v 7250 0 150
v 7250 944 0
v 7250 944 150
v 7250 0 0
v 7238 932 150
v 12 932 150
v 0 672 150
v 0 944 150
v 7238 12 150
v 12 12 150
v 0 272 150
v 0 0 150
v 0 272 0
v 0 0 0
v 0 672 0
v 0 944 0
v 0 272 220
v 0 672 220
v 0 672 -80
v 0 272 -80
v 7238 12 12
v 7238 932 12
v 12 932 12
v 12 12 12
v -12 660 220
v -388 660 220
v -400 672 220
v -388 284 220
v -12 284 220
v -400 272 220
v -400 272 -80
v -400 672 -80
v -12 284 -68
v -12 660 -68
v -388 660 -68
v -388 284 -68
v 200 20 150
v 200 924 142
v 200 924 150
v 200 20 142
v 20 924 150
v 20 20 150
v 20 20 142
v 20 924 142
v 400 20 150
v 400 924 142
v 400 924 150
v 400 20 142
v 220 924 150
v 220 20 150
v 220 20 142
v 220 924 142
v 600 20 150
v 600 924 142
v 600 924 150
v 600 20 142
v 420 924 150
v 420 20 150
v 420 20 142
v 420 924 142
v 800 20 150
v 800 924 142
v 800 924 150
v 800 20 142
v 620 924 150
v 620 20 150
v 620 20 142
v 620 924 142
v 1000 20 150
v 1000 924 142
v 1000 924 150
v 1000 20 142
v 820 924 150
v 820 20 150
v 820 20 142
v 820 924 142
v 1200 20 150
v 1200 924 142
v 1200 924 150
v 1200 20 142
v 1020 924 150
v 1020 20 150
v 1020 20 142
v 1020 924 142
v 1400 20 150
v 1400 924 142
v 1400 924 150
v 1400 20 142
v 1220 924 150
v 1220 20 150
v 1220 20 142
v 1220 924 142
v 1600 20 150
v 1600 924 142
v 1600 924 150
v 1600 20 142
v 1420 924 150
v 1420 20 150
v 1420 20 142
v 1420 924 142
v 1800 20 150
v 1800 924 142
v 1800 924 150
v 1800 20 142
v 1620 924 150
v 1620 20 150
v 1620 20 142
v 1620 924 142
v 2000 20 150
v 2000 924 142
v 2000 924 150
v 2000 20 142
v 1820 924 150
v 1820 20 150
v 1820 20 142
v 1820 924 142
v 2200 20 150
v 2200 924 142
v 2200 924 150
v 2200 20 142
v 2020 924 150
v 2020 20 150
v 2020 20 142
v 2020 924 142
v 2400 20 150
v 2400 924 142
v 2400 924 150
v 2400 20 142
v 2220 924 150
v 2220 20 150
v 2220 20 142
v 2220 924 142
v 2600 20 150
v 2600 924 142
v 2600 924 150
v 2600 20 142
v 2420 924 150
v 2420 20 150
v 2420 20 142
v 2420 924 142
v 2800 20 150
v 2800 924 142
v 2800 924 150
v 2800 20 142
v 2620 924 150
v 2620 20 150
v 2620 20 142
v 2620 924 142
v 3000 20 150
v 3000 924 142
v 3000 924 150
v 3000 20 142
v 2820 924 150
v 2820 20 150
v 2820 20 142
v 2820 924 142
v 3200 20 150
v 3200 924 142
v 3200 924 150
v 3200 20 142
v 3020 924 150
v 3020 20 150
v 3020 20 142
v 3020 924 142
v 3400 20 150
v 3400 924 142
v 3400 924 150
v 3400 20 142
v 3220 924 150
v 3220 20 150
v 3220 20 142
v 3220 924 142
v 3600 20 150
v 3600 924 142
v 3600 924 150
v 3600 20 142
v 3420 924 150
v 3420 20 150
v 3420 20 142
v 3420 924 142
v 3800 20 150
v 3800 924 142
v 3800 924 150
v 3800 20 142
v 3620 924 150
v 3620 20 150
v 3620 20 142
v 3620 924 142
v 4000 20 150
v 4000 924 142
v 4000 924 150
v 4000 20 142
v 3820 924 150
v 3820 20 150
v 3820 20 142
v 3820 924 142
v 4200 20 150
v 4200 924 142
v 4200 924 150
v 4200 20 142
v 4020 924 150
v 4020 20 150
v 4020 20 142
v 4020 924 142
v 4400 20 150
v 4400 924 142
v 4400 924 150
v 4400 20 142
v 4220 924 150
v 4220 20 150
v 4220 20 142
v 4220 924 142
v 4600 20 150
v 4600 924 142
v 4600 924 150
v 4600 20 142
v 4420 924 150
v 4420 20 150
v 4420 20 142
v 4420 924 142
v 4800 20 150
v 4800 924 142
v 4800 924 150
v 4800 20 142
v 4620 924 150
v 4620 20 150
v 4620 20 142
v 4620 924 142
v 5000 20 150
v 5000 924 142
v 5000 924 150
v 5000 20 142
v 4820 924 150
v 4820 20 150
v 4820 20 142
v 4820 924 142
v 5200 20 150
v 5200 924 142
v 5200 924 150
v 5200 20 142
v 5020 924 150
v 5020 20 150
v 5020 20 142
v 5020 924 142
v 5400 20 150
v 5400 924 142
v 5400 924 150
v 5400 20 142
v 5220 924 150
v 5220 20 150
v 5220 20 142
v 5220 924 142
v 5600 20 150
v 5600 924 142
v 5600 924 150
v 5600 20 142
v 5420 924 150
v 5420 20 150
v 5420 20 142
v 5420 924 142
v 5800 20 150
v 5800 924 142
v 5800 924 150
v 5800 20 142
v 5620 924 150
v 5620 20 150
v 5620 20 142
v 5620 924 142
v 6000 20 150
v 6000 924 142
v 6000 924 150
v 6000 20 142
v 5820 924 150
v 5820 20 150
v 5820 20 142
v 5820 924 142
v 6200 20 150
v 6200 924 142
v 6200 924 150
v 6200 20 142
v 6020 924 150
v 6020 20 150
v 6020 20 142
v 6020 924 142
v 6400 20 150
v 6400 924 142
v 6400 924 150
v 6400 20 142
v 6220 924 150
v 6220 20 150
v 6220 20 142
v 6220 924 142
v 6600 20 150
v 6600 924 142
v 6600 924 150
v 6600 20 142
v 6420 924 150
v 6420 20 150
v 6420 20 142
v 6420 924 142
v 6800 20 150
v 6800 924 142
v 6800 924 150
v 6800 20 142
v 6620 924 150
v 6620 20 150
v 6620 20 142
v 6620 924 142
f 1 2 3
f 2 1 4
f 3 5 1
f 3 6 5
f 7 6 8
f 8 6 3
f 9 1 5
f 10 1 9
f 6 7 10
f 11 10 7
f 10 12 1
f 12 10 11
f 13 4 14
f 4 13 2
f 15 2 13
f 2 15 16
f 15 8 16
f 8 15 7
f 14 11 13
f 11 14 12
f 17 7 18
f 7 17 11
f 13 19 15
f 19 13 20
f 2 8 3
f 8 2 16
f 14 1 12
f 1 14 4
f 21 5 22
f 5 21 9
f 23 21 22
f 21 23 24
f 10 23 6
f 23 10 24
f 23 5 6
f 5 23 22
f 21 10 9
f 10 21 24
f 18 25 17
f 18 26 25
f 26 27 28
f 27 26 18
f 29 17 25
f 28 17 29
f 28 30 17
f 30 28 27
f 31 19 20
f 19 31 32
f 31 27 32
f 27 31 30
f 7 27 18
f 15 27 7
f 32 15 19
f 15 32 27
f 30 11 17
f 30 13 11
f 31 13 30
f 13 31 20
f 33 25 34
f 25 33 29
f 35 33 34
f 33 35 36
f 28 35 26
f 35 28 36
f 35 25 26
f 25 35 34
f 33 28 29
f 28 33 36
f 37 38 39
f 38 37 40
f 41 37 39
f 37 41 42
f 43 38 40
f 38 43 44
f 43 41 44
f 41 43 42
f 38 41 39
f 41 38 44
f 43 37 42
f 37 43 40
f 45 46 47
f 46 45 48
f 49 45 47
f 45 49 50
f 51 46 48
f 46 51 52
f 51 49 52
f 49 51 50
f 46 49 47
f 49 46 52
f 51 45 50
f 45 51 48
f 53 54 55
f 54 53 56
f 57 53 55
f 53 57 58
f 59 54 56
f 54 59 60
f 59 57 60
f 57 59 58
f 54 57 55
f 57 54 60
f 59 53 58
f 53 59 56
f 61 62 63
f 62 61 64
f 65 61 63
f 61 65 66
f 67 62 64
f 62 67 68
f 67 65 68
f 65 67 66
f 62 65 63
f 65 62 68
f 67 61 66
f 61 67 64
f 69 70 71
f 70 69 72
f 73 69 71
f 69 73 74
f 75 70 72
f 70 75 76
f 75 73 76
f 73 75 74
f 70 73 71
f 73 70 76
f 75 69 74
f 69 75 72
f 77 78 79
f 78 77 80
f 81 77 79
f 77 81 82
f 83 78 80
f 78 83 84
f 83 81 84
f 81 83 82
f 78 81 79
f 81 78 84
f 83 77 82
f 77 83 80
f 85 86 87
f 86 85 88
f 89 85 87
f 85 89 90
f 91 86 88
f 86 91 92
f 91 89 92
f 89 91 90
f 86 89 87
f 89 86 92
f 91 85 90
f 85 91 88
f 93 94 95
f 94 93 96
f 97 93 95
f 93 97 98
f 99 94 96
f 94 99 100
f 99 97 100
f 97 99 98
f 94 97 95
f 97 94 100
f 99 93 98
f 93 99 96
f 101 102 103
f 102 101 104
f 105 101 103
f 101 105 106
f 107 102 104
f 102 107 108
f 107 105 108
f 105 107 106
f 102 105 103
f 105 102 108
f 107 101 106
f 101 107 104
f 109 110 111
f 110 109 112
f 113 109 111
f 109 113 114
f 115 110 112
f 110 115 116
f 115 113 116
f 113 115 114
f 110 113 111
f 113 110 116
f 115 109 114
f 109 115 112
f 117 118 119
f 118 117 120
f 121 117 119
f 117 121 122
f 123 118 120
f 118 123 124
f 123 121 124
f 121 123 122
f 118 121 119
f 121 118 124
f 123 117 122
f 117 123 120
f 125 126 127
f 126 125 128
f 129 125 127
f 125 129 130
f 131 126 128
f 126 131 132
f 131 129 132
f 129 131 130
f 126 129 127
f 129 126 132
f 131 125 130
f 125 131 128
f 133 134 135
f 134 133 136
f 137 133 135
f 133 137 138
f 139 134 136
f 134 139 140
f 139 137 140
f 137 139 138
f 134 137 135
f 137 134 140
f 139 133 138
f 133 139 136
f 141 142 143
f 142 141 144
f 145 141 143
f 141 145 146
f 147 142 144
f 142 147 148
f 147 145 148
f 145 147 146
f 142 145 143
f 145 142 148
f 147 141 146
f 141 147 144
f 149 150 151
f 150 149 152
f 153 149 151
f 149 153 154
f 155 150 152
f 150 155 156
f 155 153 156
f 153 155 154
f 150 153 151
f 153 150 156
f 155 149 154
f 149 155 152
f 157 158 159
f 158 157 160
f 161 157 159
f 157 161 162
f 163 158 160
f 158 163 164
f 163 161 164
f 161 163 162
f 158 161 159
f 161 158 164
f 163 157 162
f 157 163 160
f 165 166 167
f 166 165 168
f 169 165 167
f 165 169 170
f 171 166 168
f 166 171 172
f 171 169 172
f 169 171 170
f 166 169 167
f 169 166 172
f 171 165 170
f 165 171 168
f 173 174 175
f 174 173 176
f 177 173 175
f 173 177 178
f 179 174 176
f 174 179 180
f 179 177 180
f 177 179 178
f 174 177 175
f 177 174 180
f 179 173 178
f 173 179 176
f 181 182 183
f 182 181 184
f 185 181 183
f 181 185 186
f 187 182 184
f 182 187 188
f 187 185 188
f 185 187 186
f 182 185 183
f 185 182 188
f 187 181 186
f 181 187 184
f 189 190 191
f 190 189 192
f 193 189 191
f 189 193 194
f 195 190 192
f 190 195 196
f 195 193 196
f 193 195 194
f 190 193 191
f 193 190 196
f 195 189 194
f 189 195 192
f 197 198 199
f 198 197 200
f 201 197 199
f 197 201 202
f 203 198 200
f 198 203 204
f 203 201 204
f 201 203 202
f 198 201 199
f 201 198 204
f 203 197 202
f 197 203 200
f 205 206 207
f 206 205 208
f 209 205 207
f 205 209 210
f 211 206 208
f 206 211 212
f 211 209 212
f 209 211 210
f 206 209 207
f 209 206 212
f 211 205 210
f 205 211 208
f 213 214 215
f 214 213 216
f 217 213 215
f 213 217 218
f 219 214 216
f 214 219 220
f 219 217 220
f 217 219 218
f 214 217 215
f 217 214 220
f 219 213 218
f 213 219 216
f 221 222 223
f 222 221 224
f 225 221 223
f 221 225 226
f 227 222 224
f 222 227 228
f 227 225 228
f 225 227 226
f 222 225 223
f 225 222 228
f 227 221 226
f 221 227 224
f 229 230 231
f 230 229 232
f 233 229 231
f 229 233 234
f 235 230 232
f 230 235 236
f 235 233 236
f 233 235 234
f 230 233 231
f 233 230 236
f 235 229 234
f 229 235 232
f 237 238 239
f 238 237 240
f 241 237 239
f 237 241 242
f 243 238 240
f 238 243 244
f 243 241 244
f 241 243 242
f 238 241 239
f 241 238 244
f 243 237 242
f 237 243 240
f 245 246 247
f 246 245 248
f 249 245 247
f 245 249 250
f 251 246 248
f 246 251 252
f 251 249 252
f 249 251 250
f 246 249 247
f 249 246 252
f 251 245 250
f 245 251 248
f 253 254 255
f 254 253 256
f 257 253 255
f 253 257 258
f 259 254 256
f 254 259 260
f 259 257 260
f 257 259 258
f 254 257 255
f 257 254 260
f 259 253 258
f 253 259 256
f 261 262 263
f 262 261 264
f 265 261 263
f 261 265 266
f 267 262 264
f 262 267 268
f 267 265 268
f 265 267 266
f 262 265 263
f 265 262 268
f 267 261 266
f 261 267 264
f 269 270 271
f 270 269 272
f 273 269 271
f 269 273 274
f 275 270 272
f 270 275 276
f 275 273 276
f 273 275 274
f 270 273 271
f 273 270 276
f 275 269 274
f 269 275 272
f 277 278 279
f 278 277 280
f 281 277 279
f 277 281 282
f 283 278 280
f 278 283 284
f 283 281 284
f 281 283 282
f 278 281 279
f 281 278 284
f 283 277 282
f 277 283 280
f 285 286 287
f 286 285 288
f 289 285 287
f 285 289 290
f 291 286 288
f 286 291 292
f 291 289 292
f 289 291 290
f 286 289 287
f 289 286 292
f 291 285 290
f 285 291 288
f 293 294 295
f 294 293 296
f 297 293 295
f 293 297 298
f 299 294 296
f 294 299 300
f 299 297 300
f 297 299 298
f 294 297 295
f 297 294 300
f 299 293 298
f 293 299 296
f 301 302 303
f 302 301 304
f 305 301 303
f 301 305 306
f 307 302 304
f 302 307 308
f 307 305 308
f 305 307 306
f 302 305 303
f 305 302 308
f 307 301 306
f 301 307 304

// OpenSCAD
// file: ../params.scad
// Shared millimetre parameters. Keep in lockstep with freecad/params.py.
// Module scale: 150 kg/day wet train. Walls are CPVC sheet, not metal.

$fn = 36;

WALL        = 12;     // CPVC sheet thickness
FLOOR       = 16;     // floor plate (trough sits on this)

// LEACH CSTR 1 — inside liquor box
CSTR_L      = 2000;
CSTR_W      = 1200;
CSTR_H      = 1400;   // liquid + freeboard
FREEBOARD   = 200;

// CSTR 2 weir (same vessel, +X wall)
WEIR_W      = 450;
WEIR_CREST  = CSTR_H - FREEBOARD;   // from inner floor
WEIR_SLOT_H = 80;
WEIR_LIP    = 120;    // external spout projection

// CSTR 3 floor auger — injection-molded PVC / FG
AUGER_D     = 140;    // flight OD
AUGER_SHAFT = 40;
AUGER_PITCH = 110;
AUGER_TROUGH_W = 180;
AUGER_TROUGH_H = 110;
AUGER_OFFSET_Y = 280; // trough centreline from inner -Y wall
AUGER_INCLINE  = 28;  // deg, lifts out of liquor toward +X

// mixer / nozzles (lid)
MIXER_D     = 50;
GAS_D       = 80;     // acid-gas takeoff
DROP_X      = 80;     // inner-X of shred drop slot
DROP_L      = 400;
DROP_W      = 250;
DROP_COAM   = 80;     // raised coaming around the slot

// LEACHATE PUMP / coarse strainer — −X wall, opposite the weir
PUMP_D      = 80;     // DN80
PUMP_Z      = 450;    // centreline above inner floor (submerged)
PUMP_Y      = 900;    // centreline from inner −Y (away from auger)
STRAINER_L  = 180;
STRAINER_W  = 140;
STRAINER_H  = 160;

// mezzanine feed train
MEZZ_H      = 2200;   // platform top above tank outer floor
MEZZ_L      = 1600;   // platform length in −X
MEZZ_THK    = 12;
HOPPER_L    = 700;
HOPPER_W    = 600;
HOPPER_H    = 800;
SHRED_L     = 500;
SHRED_W     = 500;
SHRED_H     = 450;
CONV_W      = 240;
CONV_H      = 120;
CONV_PLATE  = 6;      // trough plate
CONV_FLANGE = 40;
CONV_SPRING_D = 50;
CONV_SPRING_H = 80;
CONV_BOLT   = 10;     // M10 clearance
CONV_LEN    = 1800;   // default standalone length; plant instance is computed
DUST_D      = 150;    // dust-hood outlet to DUST header
AUGER_LIFT_L = 700;

// dewater belts + split (Phase A 4–6)
FDEW_L      = 1800;
FDEW_W      = 450;
FDEW_H      = 80;
FDEW_RISE   = 120;    // solids end higher so liquor runs back to weir
SDEW_L      = 1400;
SDEW_W      = 220;
SDEW_H      = 80;
SPLIT_L     = 600;
SPLIT_W     = 500;
SPLIT_H     = 400;
STUB_L      = 400;
STUB_W      = 300;
STUB_H      = 250;

// EW funnel cell
EW_L        = 600;    // along aisle (overflow direction)
EW_W        = 420;    // anode-cathode depth
EW_H        = 650;    // rectangular body
EW_FUNNEL_H = 220;
EW_VALVE_D  = 50;
EW_VALVE_L  = 60;
EW_MEM_T    = 4;      // CEM
EW_SLOT     = 10;     // membrane cassette slot
EW_PITCH    = 750;    // aisle spacing, centre to centre
AISLE_X0    = 200;
AISLE_Y     = -(EW_W + 2*WALL) - 400;
AISLE_Z     = 400;
BUND_H      = 150;
BUND_PAD    = 250;
SUMP_L      = 400;
SUMP_W      = 400;
SUMP_H      = 300;
VDF_D       = 700;
VDF_L       = 900;
PAIL_W      = 180;
HDR_D       = 80;
HDR_Z       = 1400;
PYRO_D      = 320;
PYRO_L      = 2800;

// Campus envelopes — lockstep with freecad/params.py
FARM_X=12000; FARM_Y=8000; FARM_L=12000; FARM_W=8000; FARM_H=4500;
FAB_X=12000;  FAB_Y=-6000; FAB_L=8000;   FAB_W=6000;  FAB_H=4000;
HAB_X=-8000;  HAB_Y=8000;  HAB_L=8000;   HAB_W=6000;  HAB_H=3200;
CRYO_X=-6000; CRYO_Y=-4000; CRYO_L=4000; CRYO_W=3000; CRYO_H=3000;
MFG_X=2000;   MFG_Y=9000;  MFG_L=6000;   MFG_W=4000;  MFG_H=3500;

LIFE_Z_GREY=900; LIFE_Z_UPW=1100; LIFE_Z_ETCH=1300;
LIFE_Z_O2=2800; LIFE_Z_N2=3000; LIFE_Z_CO2=3200;
LIFE_D_GREY=50; LIFE_D_UPW=40; LIFE_D_ETCH=32;
LIFE_D_GAS=25; LIFE_D_CO2=40;
// main file
// 4.5 Bund lining + sump + grate. CPVC liner on CS bund.
include <../params.scad>;
$fn = 24;
aisle_len = 9 * EW_PITCH;
cell_w = EW_W + 2*WALL;

module mfg_ew_bund() {
    difference() {
        cube([aisle_len + 2*BUND_PAD, cell_w + 2*BUND_PAD, BUND_H]);
        translate([12, 12, 12])
            cube([aisle_len + 2*BUND_PAD - 24, cell_w + 2*BUND_PAD - 24, BUND_H]);
    }
    translate([-SUMP_L, (cell_w + 2*BUND_PAD)/2 - SUMP_W/2, -80])
        difference() {
            cube([SUMP_L, SUMP_W, SUMP_H]);
            translate([12, 12, 12]) cube([SUMP_L - 24, SUMP_W - 24, SUMP_H]);
        }
    // FRP grate panels
    for (x = [20:200:aisle_len])
        translate([x, 20, BUND_H - 8])
            cube([180, cell_w + 2*BUND_PAD - 40, 8]);
}
mfg_ew_bund();
